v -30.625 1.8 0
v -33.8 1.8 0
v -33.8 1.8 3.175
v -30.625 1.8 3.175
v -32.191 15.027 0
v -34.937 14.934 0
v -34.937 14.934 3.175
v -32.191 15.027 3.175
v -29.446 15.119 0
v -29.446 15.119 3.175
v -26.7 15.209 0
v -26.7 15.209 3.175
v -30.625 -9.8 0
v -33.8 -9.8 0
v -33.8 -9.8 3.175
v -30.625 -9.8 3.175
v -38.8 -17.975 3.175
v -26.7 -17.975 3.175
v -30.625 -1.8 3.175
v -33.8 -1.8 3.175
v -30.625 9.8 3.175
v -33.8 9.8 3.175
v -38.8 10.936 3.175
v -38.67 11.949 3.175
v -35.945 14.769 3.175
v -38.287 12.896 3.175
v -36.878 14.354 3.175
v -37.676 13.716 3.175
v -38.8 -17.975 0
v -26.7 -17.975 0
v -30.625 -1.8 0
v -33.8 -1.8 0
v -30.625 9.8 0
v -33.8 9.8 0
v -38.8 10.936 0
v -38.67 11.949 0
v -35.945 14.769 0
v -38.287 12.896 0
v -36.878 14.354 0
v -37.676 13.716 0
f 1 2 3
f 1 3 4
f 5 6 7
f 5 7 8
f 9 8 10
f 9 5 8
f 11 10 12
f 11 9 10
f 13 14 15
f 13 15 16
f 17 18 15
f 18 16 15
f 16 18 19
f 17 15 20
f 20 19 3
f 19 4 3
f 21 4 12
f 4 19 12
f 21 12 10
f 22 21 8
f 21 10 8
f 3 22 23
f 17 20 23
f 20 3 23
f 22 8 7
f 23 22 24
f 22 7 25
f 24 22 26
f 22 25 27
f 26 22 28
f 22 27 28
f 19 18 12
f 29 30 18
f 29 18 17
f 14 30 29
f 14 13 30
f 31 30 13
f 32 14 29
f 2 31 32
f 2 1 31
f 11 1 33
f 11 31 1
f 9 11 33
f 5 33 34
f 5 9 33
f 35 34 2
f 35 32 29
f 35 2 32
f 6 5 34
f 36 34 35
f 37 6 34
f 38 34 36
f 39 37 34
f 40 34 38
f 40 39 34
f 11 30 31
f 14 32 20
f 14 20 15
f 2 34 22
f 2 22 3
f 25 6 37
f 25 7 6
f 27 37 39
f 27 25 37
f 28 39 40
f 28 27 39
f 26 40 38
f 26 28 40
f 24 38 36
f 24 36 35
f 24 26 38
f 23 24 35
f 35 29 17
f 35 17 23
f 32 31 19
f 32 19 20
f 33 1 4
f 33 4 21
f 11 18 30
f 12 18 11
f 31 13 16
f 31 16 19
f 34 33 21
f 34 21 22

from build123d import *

# Parameters (mm, degrees)
SKETCH1_W                = 6.266
SKETCH1_H                = 19.6
SKETCH1_R                = 1.675
SKETCH1_W_2              = 52.832
SKETCH1_H_2              = 5
BOSS_EXTRUDE2_DEPTH      = 3.175
SKETCH3_W                = 30
SKETCH3_H                = 29.6
BOSS_EXTRUDE3_DEPTH      = 3.175
SKETCH4_R                = 4.85
CUT_EXTRUDE1_DEPTH       = 10
BOSS_EXTRUDE14_DEPTH     = 3.175
CUT_EXTRUDE8_DEPTH       = 10
BOSS_EXTRUDE15_DEPTH     = 3.175
BOSS_EXTRUDE16_DEPTH     = 3.175
BOSS_EXTRUDE17_DEPTH     = 3.175
FILLET5_R                = 4
SKETCH27_W               = 3.175
SKETCH27_H               = 8
CUT_EXTRUDE9_DEPTH       = 10
SKETCH28_W               = 18
SKETCH28_H               = 3.175
BOSS_EXTRUDE18_DEPTH     = 3.175
CUT_EXTRUDE10_DEPTH      = 53.993803893
CUT_EXTRUDE10_DEPTH_BACK = 53.993803893
SKETCH29_W               = 80.680500577
SKETCH29_H               = 41.601075076


with BuildPart() as part:
    # Sketch1 → Boss-Extrude2 (new body)
    # profile 1 of 4: a face of its own
    with BuildSketch(Plane.XY):
        with Locations((-23.283, 0)):
            Rectangle(SKETCH1_W, SKETCH1_H)
        with Locations((-23.95, -4.974)):
            Circle(SKETCH1_R, mode=Mode.SUBTRACT)
        with Locations((-23.95, 4.974)):
            Circle(SKETCH1_R, mode=Mode.SUBTRACT)
    # profile 2 of 4: a face of its own
    with BuildSketch(Plane.XY):
        with Locations((23.283, 0)):
            Rectangle(SKETCH1_W, SKETCH1_H)
        with Locations((23.95, -4.974)):
            Circle(SKETCH1_R, mode=Mode.SUBTRACT)
        with Locations((23.95, 4.974)):
            Circle(SKETCH1_R, mode=Mode.SUBTRACT)
    # profile 3 of 4: a face of its own
    with BuildSketch(Plane.XY):
        with Locations((0, 12.3)):
            Rectangle(SKETCH1_W_2, SKETCH1_H_2)
    # profile 4 of 4: a face of its own
    with BuildSketch(Plane.XY):
        with Locations((0, -12.3)):
            Rectangle(SKETCH1_W_2, SKETCH1_H_2)
    extrude(amount=BOSS_EXTRUDE2_DEPTH)

    # Sketch3 → Boss-Extrude3 (add)
    with BuildSketch(Plane.XY.offset(3.175)):
        with Locations((41.416, 0)):
            Rectangle(SKETCH3_W, SKETCH3_H)
    extrude(amount=-BOSS_EXTRUDE3_DEPTH)

    # Sketch4 → Cut-Extrude1 (cut)
    with BuildSketch(Plane(origin=(0, 0, 0), x_dir=(-1, 0, 0), z_dir=(0, 0, -1))):
        with Locations((-40.576, 7.77)):
            Circle(SKETCH4_R)
    extrude(amount=-CUT_EXTRUDE1_DEPTH, mode=Mode.SUBTRACT)

    # Sketch22 → Boss-Extrude14 (add)
    with BuildSketch(Plane(origin=(0, 0, 0), x_dir=(-1, 0, 0), z_dir=(0, 0, -1))):
        with BuildLine():
            ThreePointArc((-34.680262133, 14.8), (-40.576, 16.945), (-46.471737867, 14.8))
            Line((-46.471737867, 14.8), (-34.680262133, 14.8))
        make_face()
    extrude(amount=-BOSS_EXTRUDE14_DEPTH)

    # Sketch23 → Cut-Extrude8 (cut)
    with BuildSketch(Plane(origin=(0, 0, 0), x_dir=(-1, 0, 0), z_dir=(0, 0, -1))):
        with BuildLine():
            Line((-49.751, -14.8), (-49.751, 7.77))
            ThreePointArc((-49.751, 7.77), (-48.890866804, 11.648609936), (-46.471737867, 14.8))
            Line((-46.471737867, 14.8), (-56.416, 14.8))
            Line((-56.416, 14.8), (-56.416, -14.8))
            Line((-56.416, -14.8), (-49.751, -14.8))
        make_face()
    extrude(amount=-CUT_EXTRUDE8_DEPTH, mode=Mode.SUBTRACT)

    # Sketch24 → Boss-Extrude15 (add)
    with BuildSketch(Plane(origin=(0, 0, 0), x_dir=(-1, 0, 0), z_dir=(0, 0, -1))):
        Polygon((30.625, 14.8), (26.416, 14.8), (26.416, -14.8), (27.751006616, -14.8), (30.625, -14.8), align=None)
    extrude(amount=-BOSS_EXTRUDE15_DEPTH)

    # Sketch25 → Boss-Extrude16 (add)
    with BuildSketch(Plane(origin=(0, 0, 0), x_dir=(-1, 0, 0), z_dir=(0, 0, -1))):
        Polygon((30.625, 14.8), (30.625, 9.8), (33.8, 9.8), (33.8, 1.8), (30.625, 1.8), (30.625, -1.8), (33.8, -1.8), (33.8, -9.8), (30.625, -9.8), (30.625, -14.8), (31.879074074, -14.8), (38.8, -14.8), (38.8, 14.8), align=None)
    extrude(amount=-BOSS_EXTRUDE16_DEPTH)

    # Sketch26 → Boss-Extrude17 (add)
    with BuildSketch(Plane(origin=(0, 0, 0), x_dir=(-1, 0, 0), z_dir=(0, 0, -1))):
        with BuildLine():
            ThreePointArc((-40.225848077, 16.938316019), (-37.275108655, 16.330650754), (-34.680262133, 14.8))
            Line((-34.680262133, 14.8), (38.8, 14.8))
            ThreePointArc((38.8, 14.8), (-0.708684686, 16.025831975), (-40.225848077, 16.938316019))
        make_face()
    extrude(amount=-BOSS_EXTRUDE17_DEPTH)

    # Fillet5
    fillet5_edges = [part.edges().sort_by_distance(p)[0] for p in [
        (-38.8, 14.8, 1.5875),
    ]]
    fillet(fillet5_edges, radius=FILLET5_R)

    # Sketch27 → Cut-Extrude9 (cut)
    with BuildSketch(Plane(origin=(0, 0, 0), x_dir=(-1, 0, 0), z_dir=(0, 0, -1))):
        with Locations((-43.1635, -5.8)):
            Rectangle(SKETCH27_W, SKETCH27_H)
    extrude(amount=-CUT_EXTRUDE9_DEPTH, mode=Mode.SUBTRACT)

    # Sketch28 → Boss-Extrude18 (add)
    with BuildSketch(Plane(origin=(0, 0, 0), x_dir=(-1, 0, 0), z_dir=(0, 0, -1))):
        with Locations((-40.751, -16.3875)):
            Rectangle(SKETCH28_W, SKETCH28_H)
        with Locations((-5.45, -16.3875)):
            Rectangle(SKETCH28_W, SKETCH28_H)
        with Locations((29.8, -16.3875)):
            Rectangle(SKETCH28_W, SKETCH28_H)
    extrude(amount=-BOSS_EXTRUDE18_DEPTH)

    # Sketch29 → Cut-Extrude10 (cut, two sides: drawn at the far end of the back side and taken through both)
    with BuildSketch(Plane(origin=(0, 0, 0), x_dir=(-1, 0, 0), z_dir=(0, 0, -1)).offset(-CUT_EXTRUDE10_DEPTH_BACK)):
        with Locations((-13.640250288, -3.363421895)):
            Rectangle(SKETCH29_W, SKETCH29_H)
    extrude(amount=CUT_EXTRUDE10_DEPTH + CUT_EXTRUDE10_DEPTH_BACK, mode=Mode.SUBTRACT)


solid = part.part
